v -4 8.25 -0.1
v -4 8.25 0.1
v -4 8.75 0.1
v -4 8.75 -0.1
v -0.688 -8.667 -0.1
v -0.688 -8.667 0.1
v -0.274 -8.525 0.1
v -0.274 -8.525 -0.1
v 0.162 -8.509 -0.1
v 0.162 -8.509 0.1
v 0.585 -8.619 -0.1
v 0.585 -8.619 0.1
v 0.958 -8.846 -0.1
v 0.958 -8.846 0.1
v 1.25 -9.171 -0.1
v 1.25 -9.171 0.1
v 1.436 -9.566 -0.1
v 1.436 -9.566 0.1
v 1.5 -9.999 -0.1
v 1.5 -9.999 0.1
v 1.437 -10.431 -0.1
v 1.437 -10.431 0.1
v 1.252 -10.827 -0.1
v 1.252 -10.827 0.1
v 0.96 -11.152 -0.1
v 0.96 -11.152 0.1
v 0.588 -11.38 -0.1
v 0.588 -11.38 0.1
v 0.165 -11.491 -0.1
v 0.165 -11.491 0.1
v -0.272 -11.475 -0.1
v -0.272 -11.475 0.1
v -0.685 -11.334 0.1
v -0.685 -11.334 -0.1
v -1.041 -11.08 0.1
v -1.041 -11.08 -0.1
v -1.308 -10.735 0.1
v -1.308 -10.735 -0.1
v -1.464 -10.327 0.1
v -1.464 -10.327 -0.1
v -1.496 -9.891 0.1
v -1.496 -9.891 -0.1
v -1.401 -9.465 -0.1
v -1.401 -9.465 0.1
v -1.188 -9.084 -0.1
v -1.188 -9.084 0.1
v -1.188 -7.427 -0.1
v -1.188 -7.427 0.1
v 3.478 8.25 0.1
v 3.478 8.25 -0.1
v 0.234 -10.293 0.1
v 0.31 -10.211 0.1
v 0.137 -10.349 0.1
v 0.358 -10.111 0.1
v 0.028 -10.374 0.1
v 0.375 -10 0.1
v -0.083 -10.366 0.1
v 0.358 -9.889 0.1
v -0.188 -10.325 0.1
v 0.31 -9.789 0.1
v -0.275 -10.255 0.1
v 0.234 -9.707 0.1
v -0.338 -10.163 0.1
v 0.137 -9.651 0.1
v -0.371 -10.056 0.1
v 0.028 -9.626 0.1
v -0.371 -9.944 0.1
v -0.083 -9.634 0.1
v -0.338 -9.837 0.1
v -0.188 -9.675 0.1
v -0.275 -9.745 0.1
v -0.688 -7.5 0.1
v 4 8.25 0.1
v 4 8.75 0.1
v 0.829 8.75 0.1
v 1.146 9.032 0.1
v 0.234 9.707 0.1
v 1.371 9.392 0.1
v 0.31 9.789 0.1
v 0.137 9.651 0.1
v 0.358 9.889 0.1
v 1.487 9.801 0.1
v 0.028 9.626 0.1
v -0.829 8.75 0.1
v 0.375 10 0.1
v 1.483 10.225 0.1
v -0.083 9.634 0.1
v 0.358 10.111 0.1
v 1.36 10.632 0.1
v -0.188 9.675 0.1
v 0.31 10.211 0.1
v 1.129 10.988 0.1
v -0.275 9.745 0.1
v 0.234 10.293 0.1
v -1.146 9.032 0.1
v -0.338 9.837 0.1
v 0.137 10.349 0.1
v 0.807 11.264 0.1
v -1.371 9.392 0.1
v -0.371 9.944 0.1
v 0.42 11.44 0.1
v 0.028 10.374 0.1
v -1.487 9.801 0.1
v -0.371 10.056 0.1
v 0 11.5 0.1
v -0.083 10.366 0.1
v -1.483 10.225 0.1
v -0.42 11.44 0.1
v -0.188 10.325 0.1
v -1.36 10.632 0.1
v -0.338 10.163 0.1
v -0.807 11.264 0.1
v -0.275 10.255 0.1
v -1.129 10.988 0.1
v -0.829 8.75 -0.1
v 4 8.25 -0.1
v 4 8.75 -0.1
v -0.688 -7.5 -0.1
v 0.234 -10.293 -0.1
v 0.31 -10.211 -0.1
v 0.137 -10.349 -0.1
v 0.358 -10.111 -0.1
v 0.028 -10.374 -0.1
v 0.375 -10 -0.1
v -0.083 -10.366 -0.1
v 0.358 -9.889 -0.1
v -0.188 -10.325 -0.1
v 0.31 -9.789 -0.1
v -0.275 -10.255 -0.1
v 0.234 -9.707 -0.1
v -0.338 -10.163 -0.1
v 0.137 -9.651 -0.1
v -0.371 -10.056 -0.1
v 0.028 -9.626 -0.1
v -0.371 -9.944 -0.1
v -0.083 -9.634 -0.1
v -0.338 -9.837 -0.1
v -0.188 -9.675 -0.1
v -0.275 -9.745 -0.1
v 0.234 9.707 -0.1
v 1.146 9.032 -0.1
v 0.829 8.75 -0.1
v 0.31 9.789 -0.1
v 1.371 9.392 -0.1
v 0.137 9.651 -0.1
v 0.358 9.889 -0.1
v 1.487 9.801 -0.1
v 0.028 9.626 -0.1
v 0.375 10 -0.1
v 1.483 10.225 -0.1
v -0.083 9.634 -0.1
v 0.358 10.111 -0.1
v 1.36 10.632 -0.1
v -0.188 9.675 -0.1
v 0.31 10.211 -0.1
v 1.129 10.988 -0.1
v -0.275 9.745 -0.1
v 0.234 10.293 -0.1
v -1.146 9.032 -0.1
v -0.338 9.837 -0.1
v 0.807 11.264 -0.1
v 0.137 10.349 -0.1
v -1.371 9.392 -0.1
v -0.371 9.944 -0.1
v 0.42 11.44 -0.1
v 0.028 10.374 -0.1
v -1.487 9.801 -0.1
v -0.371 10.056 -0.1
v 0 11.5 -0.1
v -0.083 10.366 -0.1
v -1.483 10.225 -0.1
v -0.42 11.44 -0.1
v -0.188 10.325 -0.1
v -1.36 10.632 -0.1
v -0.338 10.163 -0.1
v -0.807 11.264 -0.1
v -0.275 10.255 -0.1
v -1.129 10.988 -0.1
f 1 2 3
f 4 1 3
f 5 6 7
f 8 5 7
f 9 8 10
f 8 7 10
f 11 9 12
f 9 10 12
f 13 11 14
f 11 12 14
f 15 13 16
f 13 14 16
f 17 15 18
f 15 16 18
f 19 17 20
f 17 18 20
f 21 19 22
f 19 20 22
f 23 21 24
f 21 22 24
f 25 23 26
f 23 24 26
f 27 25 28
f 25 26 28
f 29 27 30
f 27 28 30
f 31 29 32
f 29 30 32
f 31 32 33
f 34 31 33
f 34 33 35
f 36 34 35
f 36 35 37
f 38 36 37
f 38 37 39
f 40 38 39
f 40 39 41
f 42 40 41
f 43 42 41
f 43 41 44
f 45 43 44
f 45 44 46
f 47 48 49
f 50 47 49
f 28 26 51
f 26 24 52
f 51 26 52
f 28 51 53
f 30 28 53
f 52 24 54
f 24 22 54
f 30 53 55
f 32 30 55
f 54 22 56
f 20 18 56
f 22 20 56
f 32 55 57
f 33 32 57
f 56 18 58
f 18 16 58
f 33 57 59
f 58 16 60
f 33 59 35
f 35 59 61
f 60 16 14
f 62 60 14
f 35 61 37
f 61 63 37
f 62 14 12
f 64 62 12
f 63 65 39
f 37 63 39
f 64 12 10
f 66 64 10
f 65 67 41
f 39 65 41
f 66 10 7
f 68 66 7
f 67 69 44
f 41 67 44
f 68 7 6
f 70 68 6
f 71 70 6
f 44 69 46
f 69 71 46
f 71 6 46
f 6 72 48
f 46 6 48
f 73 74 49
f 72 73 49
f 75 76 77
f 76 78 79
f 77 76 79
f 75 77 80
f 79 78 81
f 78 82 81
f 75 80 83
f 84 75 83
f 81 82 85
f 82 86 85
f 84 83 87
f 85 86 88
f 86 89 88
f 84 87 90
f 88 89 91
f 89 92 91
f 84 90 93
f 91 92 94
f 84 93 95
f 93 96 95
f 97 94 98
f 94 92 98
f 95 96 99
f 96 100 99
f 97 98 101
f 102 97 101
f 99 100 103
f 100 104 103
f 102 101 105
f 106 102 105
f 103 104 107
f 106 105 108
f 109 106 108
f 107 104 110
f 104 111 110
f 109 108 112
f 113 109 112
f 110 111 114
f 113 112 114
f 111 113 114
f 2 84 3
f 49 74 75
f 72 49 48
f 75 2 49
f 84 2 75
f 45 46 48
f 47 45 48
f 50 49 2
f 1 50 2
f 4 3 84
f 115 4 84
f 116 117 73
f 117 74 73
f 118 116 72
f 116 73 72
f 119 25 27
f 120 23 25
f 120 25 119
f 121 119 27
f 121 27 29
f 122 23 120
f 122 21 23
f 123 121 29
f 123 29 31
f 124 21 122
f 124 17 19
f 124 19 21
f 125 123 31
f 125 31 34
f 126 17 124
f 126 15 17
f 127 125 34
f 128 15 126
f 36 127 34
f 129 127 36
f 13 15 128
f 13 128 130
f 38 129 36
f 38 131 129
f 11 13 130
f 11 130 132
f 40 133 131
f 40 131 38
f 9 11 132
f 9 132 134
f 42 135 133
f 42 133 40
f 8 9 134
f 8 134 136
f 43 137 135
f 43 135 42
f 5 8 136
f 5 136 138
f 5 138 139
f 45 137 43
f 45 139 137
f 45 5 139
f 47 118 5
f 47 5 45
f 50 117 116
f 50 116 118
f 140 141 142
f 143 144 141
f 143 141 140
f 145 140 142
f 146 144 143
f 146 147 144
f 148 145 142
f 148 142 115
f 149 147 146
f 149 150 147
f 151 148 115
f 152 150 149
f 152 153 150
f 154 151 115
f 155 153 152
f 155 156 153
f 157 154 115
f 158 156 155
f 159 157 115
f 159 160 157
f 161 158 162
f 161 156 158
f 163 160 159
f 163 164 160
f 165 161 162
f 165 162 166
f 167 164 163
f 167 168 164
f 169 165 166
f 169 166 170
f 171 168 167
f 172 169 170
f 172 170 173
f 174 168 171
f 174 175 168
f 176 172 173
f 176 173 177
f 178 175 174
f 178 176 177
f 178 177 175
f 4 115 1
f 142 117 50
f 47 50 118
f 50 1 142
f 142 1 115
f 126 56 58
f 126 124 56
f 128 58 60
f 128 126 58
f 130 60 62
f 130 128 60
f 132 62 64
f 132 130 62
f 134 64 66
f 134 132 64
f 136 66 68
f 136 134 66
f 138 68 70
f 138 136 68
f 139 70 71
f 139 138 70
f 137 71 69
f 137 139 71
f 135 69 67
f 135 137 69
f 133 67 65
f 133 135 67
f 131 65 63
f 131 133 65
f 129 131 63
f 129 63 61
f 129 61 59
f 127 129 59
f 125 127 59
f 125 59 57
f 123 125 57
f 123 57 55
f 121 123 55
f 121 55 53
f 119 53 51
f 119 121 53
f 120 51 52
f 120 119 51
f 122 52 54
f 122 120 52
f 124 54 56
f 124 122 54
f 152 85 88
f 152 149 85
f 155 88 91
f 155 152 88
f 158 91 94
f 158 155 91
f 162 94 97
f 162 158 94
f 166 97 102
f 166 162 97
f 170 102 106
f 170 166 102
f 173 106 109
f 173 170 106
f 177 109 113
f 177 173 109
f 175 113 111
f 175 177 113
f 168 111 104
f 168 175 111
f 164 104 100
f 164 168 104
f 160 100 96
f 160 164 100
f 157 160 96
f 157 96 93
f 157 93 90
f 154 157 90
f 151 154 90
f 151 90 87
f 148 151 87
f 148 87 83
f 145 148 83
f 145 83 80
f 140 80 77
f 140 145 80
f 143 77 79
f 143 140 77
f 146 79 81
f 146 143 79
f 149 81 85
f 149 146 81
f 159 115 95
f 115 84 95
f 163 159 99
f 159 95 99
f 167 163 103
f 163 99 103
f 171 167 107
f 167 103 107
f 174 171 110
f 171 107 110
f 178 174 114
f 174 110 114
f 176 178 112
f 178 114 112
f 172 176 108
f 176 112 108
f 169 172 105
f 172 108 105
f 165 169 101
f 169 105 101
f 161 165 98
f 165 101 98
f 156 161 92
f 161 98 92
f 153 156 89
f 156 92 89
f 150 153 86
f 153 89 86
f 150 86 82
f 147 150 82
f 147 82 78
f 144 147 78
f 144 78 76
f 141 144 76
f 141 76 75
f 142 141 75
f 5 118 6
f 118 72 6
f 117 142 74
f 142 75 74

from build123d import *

# Parameters (mm, degrees)
SKETCH1_R           = 0.375
BOSS_EXTRUDE1_DEPTH = 0.1


with BuildPart() as part:
    # Sketch1 → Boss-Extrude1 (new body, symmetric)
    with BuildSketch(Plane.XY):
        with BuildLine():
            Line((-4, 8.75), (-0.829156198, 8.75))
            ThreePointArc((-0.829156198, 8.75), (0, 11.5), (0.829156198, 8.75))
            Line((0.829156198, 8.75), (4, 8.75))
            Line((4, 8.75), (4, 8.25))
            Line((4, 8.25), (-0.6875, -7.5))
            Line((-0.6875, -7.5), (-0.6875, -8.666829437))
            ThreePointArc((-0.6875, -8.666829437), (0.960377242, -11.152248043), (-1.1875, -9.083570106))
            Line((-1.1875, -9.083570106), (-1.1875, -7.427173711))
            Line((-1.1875, -7.427173711), (3.478325509, 8.25))
            Line((3.478325509, 8.25), (-4, 8.25))
            Line((-4, 8.25), (-4, 8.75))
        make_face()
        with Locations((0, 10)):
            Circle(SKETCH1_R, mode=Mode.SUBTRACT)
        with Locations((0, -10)):
            Circle(SKETCH1_R, mode=Mode.SUBTRACT)
    extrude(amount=BOSS_EXTRUDE1_DEPTH, both=True)


solid = part.part
